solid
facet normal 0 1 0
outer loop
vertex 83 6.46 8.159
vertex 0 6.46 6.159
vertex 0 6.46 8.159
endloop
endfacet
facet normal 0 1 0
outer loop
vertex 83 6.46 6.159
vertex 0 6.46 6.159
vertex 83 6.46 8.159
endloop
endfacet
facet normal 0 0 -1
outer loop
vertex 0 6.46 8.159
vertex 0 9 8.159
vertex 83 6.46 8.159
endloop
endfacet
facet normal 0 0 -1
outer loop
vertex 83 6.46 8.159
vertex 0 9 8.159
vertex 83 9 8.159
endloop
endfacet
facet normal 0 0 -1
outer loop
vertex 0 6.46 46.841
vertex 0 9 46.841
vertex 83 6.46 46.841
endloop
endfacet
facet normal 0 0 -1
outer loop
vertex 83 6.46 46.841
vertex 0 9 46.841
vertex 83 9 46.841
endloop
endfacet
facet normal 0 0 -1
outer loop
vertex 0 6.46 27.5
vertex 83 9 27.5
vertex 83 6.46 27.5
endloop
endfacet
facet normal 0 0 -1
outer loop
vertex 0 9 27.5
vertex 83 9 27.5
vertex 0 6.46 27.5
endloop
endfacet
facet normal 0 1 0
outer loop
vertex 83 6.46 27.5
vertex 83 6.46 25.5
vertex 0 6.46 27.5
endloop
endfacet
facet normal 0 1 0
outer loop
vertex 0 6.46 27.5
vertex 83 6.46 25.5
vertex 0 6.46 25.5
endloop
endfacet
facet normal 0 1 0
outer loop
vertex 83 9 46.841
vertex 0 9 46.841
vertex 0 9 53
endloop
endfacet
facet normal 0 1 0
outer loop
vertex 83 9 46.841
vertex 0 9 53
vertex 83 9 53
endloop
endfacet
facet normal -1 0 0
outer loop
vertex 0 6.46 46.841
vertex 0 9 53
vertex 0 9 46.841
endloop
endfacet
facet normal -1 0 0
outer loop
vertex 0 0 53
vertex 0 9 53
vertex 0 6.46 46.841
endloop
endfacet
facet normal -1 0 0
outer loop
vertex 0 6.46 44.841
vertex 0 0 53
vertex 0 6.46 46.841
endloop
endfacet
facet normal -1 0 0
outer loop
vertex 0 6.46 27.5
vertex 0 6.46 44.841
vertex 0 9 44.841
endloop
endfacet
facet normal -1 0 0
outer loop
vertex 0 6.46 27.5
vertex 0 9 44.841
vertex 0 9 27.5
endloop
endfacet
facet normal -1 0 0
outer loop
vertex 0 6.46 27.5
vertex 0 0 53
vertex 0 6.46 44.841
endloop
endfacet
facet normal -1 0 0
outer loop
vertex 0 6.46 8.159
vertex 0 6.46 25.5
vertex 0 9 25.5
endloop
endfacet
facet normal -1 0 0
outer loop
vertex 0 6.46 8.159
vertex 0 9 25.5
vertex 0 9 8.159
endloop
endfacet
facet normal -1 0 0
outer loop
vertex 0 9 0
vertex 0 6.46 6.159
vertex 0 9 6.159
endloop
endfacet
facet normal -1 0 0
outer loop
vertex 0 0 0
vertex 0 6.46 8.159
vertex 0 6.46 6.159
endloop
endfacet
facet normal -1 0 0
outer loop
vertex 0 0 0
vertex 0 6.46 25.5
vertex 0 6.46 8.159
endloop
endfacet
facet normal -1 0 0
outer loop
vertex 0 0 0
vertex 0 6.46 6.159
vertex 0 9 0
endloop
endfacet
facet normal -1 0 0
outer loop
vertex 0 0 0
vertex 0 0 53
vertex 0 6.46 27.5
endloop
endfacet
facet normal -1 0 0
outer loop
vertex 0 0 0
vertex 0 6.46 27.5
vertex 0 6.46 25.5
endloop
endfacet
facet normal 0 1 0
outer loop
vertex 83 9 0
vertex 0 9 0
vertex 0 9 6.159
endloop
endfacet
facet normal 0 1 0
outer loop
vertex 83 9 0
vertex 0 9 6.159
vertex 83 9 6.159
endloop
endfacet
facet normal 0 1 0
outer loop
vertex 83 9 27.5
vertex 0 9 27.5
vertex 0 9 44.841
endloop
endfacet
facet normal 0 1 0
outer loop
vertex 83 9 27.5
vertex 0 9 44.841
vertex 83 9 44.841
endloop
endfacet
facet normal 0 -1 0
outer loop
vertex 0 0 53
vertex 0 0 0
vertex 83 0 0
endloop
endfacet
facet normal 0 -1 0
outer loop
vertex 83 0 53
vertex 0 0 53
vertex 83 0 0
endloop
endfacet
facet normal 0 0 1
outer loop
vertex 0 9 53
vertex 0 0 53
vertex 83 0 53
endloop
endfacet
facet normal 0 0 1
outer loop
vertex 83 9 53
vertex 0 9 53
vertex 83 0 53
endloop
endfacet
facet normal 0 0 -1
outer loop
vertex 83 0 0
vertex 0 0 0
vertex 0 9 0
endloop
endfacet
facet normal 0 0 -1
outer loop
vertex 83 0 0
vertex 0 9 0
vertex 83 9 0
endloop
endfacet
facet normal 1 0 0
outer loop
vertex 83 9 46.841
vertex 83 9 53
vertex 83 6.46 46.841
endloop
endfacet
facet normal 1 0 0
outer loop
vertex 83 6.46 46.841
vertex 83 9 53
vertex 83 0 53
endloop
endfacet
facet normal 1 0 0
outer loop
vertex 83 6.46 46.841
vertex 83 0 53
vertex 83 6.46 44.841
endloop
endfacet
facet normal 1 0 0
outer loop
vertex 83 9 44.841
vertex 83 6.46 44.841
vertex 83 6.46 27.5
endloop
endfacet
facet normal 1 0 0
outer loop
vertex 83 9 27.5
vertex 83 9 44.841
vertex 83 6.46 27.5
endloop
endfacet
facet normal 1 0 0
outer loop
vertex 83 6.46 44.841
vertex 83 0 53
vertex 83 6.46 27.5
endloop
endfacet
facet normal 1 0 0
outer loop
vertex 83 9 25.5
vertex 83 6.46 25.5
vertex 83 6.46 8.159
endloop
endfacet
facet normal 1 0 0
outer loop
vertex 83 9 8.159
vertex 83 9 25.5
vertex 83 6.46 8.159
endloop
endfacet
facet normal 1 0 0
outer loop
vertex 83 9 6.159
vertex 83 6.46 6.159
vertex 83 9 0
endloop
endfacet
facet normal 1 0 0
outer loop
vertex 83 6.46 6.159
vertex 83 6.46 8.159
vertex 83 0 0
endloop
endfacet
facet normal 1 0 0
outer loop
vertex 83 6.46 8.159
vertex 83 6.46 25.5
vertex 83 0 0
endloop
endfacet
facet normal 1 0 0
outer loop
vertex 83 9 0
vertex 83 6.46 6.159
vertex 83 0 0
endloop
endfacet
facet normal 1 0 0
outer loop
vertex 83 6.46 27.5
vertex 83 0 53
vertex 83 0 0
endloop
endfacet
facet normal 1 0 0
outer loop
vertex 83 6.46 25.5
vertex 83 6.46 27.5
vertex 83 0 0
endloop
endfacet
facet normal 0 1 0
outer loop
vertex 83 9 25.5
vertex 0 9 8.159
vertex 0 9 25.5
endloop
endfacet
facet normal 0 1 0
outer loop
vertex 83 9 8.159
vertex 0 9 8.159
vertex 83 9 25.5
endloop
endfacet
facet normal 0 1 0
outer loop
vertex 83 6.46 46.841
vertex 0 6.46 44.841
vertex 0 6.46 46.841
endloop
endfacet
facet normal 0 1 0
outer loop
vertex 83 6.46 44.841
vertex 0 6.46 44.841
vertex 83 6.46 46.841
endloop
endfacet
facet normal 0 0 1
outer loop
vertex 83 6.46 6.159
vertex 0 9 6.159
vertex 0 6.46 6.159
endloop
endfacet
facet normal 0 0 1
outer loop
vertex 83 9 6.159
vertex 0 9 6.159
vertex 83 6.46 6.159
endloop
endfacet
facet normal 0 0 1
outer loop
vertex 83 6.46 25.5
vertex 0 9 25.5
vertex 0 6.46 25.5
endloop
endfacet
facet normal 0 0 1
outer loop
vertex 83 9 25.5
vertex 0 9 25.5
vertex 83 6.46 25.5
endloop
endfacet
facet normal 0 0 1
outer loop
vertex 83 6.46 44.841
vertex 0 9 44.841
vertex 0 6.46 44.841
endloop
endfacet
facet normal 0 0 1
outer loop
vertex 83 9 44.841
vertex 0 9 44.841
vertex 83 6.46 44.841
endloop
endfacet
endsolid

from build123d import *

# Parameters (mm, degrees)
SKETCH1_W           = 83
SKETCH1_H           = 53
BOSS_EXTRUDE1_DEPTH = 9
SKETCH2_W           = 83
SKETCH2_H           = 2
CUT_EXTRUDE1_DEPTH  = 2.54


with BuildPart() as part:
    # Sketch1 → Boss-Extrude1 (new body)
    with BuildSketch(Plane(origin=(0, 0, 0), x_dir=(1, 0, 0), z_dir=(0, 1, 0))):
        with Locations((41.5, -26.5)):
            Rectangle(SKETCH1_W, SKETCH1_H)
    extrude(amount=BOSS_EXTRUDE1_DEPTH)

    # Sketch2 → Cut-Extrude1 (cut)
    with BuildSketch(Plane(origin=(0, 9, 0), x_dir=(1, 0, 0), z_dir=(0, 1, 0))):
        Polygon((0, -27.5), (0, -25.5), (83, -25.5), (83, -26.5), (83, -27.5), align=None)
        with Locations((41.5, -7.159340371)):
            Rectangle(SKETCH2_W, SKETCH2_H)
        with Locations((41.5, -45.840659629)):
            Rectangle(SKETCH2_W, SKETCH2_H)
    extrude(amount=-CUT_EXTRUDE1_DEPTH, mode=Mode.SUBTRACT)


solid = part.part
